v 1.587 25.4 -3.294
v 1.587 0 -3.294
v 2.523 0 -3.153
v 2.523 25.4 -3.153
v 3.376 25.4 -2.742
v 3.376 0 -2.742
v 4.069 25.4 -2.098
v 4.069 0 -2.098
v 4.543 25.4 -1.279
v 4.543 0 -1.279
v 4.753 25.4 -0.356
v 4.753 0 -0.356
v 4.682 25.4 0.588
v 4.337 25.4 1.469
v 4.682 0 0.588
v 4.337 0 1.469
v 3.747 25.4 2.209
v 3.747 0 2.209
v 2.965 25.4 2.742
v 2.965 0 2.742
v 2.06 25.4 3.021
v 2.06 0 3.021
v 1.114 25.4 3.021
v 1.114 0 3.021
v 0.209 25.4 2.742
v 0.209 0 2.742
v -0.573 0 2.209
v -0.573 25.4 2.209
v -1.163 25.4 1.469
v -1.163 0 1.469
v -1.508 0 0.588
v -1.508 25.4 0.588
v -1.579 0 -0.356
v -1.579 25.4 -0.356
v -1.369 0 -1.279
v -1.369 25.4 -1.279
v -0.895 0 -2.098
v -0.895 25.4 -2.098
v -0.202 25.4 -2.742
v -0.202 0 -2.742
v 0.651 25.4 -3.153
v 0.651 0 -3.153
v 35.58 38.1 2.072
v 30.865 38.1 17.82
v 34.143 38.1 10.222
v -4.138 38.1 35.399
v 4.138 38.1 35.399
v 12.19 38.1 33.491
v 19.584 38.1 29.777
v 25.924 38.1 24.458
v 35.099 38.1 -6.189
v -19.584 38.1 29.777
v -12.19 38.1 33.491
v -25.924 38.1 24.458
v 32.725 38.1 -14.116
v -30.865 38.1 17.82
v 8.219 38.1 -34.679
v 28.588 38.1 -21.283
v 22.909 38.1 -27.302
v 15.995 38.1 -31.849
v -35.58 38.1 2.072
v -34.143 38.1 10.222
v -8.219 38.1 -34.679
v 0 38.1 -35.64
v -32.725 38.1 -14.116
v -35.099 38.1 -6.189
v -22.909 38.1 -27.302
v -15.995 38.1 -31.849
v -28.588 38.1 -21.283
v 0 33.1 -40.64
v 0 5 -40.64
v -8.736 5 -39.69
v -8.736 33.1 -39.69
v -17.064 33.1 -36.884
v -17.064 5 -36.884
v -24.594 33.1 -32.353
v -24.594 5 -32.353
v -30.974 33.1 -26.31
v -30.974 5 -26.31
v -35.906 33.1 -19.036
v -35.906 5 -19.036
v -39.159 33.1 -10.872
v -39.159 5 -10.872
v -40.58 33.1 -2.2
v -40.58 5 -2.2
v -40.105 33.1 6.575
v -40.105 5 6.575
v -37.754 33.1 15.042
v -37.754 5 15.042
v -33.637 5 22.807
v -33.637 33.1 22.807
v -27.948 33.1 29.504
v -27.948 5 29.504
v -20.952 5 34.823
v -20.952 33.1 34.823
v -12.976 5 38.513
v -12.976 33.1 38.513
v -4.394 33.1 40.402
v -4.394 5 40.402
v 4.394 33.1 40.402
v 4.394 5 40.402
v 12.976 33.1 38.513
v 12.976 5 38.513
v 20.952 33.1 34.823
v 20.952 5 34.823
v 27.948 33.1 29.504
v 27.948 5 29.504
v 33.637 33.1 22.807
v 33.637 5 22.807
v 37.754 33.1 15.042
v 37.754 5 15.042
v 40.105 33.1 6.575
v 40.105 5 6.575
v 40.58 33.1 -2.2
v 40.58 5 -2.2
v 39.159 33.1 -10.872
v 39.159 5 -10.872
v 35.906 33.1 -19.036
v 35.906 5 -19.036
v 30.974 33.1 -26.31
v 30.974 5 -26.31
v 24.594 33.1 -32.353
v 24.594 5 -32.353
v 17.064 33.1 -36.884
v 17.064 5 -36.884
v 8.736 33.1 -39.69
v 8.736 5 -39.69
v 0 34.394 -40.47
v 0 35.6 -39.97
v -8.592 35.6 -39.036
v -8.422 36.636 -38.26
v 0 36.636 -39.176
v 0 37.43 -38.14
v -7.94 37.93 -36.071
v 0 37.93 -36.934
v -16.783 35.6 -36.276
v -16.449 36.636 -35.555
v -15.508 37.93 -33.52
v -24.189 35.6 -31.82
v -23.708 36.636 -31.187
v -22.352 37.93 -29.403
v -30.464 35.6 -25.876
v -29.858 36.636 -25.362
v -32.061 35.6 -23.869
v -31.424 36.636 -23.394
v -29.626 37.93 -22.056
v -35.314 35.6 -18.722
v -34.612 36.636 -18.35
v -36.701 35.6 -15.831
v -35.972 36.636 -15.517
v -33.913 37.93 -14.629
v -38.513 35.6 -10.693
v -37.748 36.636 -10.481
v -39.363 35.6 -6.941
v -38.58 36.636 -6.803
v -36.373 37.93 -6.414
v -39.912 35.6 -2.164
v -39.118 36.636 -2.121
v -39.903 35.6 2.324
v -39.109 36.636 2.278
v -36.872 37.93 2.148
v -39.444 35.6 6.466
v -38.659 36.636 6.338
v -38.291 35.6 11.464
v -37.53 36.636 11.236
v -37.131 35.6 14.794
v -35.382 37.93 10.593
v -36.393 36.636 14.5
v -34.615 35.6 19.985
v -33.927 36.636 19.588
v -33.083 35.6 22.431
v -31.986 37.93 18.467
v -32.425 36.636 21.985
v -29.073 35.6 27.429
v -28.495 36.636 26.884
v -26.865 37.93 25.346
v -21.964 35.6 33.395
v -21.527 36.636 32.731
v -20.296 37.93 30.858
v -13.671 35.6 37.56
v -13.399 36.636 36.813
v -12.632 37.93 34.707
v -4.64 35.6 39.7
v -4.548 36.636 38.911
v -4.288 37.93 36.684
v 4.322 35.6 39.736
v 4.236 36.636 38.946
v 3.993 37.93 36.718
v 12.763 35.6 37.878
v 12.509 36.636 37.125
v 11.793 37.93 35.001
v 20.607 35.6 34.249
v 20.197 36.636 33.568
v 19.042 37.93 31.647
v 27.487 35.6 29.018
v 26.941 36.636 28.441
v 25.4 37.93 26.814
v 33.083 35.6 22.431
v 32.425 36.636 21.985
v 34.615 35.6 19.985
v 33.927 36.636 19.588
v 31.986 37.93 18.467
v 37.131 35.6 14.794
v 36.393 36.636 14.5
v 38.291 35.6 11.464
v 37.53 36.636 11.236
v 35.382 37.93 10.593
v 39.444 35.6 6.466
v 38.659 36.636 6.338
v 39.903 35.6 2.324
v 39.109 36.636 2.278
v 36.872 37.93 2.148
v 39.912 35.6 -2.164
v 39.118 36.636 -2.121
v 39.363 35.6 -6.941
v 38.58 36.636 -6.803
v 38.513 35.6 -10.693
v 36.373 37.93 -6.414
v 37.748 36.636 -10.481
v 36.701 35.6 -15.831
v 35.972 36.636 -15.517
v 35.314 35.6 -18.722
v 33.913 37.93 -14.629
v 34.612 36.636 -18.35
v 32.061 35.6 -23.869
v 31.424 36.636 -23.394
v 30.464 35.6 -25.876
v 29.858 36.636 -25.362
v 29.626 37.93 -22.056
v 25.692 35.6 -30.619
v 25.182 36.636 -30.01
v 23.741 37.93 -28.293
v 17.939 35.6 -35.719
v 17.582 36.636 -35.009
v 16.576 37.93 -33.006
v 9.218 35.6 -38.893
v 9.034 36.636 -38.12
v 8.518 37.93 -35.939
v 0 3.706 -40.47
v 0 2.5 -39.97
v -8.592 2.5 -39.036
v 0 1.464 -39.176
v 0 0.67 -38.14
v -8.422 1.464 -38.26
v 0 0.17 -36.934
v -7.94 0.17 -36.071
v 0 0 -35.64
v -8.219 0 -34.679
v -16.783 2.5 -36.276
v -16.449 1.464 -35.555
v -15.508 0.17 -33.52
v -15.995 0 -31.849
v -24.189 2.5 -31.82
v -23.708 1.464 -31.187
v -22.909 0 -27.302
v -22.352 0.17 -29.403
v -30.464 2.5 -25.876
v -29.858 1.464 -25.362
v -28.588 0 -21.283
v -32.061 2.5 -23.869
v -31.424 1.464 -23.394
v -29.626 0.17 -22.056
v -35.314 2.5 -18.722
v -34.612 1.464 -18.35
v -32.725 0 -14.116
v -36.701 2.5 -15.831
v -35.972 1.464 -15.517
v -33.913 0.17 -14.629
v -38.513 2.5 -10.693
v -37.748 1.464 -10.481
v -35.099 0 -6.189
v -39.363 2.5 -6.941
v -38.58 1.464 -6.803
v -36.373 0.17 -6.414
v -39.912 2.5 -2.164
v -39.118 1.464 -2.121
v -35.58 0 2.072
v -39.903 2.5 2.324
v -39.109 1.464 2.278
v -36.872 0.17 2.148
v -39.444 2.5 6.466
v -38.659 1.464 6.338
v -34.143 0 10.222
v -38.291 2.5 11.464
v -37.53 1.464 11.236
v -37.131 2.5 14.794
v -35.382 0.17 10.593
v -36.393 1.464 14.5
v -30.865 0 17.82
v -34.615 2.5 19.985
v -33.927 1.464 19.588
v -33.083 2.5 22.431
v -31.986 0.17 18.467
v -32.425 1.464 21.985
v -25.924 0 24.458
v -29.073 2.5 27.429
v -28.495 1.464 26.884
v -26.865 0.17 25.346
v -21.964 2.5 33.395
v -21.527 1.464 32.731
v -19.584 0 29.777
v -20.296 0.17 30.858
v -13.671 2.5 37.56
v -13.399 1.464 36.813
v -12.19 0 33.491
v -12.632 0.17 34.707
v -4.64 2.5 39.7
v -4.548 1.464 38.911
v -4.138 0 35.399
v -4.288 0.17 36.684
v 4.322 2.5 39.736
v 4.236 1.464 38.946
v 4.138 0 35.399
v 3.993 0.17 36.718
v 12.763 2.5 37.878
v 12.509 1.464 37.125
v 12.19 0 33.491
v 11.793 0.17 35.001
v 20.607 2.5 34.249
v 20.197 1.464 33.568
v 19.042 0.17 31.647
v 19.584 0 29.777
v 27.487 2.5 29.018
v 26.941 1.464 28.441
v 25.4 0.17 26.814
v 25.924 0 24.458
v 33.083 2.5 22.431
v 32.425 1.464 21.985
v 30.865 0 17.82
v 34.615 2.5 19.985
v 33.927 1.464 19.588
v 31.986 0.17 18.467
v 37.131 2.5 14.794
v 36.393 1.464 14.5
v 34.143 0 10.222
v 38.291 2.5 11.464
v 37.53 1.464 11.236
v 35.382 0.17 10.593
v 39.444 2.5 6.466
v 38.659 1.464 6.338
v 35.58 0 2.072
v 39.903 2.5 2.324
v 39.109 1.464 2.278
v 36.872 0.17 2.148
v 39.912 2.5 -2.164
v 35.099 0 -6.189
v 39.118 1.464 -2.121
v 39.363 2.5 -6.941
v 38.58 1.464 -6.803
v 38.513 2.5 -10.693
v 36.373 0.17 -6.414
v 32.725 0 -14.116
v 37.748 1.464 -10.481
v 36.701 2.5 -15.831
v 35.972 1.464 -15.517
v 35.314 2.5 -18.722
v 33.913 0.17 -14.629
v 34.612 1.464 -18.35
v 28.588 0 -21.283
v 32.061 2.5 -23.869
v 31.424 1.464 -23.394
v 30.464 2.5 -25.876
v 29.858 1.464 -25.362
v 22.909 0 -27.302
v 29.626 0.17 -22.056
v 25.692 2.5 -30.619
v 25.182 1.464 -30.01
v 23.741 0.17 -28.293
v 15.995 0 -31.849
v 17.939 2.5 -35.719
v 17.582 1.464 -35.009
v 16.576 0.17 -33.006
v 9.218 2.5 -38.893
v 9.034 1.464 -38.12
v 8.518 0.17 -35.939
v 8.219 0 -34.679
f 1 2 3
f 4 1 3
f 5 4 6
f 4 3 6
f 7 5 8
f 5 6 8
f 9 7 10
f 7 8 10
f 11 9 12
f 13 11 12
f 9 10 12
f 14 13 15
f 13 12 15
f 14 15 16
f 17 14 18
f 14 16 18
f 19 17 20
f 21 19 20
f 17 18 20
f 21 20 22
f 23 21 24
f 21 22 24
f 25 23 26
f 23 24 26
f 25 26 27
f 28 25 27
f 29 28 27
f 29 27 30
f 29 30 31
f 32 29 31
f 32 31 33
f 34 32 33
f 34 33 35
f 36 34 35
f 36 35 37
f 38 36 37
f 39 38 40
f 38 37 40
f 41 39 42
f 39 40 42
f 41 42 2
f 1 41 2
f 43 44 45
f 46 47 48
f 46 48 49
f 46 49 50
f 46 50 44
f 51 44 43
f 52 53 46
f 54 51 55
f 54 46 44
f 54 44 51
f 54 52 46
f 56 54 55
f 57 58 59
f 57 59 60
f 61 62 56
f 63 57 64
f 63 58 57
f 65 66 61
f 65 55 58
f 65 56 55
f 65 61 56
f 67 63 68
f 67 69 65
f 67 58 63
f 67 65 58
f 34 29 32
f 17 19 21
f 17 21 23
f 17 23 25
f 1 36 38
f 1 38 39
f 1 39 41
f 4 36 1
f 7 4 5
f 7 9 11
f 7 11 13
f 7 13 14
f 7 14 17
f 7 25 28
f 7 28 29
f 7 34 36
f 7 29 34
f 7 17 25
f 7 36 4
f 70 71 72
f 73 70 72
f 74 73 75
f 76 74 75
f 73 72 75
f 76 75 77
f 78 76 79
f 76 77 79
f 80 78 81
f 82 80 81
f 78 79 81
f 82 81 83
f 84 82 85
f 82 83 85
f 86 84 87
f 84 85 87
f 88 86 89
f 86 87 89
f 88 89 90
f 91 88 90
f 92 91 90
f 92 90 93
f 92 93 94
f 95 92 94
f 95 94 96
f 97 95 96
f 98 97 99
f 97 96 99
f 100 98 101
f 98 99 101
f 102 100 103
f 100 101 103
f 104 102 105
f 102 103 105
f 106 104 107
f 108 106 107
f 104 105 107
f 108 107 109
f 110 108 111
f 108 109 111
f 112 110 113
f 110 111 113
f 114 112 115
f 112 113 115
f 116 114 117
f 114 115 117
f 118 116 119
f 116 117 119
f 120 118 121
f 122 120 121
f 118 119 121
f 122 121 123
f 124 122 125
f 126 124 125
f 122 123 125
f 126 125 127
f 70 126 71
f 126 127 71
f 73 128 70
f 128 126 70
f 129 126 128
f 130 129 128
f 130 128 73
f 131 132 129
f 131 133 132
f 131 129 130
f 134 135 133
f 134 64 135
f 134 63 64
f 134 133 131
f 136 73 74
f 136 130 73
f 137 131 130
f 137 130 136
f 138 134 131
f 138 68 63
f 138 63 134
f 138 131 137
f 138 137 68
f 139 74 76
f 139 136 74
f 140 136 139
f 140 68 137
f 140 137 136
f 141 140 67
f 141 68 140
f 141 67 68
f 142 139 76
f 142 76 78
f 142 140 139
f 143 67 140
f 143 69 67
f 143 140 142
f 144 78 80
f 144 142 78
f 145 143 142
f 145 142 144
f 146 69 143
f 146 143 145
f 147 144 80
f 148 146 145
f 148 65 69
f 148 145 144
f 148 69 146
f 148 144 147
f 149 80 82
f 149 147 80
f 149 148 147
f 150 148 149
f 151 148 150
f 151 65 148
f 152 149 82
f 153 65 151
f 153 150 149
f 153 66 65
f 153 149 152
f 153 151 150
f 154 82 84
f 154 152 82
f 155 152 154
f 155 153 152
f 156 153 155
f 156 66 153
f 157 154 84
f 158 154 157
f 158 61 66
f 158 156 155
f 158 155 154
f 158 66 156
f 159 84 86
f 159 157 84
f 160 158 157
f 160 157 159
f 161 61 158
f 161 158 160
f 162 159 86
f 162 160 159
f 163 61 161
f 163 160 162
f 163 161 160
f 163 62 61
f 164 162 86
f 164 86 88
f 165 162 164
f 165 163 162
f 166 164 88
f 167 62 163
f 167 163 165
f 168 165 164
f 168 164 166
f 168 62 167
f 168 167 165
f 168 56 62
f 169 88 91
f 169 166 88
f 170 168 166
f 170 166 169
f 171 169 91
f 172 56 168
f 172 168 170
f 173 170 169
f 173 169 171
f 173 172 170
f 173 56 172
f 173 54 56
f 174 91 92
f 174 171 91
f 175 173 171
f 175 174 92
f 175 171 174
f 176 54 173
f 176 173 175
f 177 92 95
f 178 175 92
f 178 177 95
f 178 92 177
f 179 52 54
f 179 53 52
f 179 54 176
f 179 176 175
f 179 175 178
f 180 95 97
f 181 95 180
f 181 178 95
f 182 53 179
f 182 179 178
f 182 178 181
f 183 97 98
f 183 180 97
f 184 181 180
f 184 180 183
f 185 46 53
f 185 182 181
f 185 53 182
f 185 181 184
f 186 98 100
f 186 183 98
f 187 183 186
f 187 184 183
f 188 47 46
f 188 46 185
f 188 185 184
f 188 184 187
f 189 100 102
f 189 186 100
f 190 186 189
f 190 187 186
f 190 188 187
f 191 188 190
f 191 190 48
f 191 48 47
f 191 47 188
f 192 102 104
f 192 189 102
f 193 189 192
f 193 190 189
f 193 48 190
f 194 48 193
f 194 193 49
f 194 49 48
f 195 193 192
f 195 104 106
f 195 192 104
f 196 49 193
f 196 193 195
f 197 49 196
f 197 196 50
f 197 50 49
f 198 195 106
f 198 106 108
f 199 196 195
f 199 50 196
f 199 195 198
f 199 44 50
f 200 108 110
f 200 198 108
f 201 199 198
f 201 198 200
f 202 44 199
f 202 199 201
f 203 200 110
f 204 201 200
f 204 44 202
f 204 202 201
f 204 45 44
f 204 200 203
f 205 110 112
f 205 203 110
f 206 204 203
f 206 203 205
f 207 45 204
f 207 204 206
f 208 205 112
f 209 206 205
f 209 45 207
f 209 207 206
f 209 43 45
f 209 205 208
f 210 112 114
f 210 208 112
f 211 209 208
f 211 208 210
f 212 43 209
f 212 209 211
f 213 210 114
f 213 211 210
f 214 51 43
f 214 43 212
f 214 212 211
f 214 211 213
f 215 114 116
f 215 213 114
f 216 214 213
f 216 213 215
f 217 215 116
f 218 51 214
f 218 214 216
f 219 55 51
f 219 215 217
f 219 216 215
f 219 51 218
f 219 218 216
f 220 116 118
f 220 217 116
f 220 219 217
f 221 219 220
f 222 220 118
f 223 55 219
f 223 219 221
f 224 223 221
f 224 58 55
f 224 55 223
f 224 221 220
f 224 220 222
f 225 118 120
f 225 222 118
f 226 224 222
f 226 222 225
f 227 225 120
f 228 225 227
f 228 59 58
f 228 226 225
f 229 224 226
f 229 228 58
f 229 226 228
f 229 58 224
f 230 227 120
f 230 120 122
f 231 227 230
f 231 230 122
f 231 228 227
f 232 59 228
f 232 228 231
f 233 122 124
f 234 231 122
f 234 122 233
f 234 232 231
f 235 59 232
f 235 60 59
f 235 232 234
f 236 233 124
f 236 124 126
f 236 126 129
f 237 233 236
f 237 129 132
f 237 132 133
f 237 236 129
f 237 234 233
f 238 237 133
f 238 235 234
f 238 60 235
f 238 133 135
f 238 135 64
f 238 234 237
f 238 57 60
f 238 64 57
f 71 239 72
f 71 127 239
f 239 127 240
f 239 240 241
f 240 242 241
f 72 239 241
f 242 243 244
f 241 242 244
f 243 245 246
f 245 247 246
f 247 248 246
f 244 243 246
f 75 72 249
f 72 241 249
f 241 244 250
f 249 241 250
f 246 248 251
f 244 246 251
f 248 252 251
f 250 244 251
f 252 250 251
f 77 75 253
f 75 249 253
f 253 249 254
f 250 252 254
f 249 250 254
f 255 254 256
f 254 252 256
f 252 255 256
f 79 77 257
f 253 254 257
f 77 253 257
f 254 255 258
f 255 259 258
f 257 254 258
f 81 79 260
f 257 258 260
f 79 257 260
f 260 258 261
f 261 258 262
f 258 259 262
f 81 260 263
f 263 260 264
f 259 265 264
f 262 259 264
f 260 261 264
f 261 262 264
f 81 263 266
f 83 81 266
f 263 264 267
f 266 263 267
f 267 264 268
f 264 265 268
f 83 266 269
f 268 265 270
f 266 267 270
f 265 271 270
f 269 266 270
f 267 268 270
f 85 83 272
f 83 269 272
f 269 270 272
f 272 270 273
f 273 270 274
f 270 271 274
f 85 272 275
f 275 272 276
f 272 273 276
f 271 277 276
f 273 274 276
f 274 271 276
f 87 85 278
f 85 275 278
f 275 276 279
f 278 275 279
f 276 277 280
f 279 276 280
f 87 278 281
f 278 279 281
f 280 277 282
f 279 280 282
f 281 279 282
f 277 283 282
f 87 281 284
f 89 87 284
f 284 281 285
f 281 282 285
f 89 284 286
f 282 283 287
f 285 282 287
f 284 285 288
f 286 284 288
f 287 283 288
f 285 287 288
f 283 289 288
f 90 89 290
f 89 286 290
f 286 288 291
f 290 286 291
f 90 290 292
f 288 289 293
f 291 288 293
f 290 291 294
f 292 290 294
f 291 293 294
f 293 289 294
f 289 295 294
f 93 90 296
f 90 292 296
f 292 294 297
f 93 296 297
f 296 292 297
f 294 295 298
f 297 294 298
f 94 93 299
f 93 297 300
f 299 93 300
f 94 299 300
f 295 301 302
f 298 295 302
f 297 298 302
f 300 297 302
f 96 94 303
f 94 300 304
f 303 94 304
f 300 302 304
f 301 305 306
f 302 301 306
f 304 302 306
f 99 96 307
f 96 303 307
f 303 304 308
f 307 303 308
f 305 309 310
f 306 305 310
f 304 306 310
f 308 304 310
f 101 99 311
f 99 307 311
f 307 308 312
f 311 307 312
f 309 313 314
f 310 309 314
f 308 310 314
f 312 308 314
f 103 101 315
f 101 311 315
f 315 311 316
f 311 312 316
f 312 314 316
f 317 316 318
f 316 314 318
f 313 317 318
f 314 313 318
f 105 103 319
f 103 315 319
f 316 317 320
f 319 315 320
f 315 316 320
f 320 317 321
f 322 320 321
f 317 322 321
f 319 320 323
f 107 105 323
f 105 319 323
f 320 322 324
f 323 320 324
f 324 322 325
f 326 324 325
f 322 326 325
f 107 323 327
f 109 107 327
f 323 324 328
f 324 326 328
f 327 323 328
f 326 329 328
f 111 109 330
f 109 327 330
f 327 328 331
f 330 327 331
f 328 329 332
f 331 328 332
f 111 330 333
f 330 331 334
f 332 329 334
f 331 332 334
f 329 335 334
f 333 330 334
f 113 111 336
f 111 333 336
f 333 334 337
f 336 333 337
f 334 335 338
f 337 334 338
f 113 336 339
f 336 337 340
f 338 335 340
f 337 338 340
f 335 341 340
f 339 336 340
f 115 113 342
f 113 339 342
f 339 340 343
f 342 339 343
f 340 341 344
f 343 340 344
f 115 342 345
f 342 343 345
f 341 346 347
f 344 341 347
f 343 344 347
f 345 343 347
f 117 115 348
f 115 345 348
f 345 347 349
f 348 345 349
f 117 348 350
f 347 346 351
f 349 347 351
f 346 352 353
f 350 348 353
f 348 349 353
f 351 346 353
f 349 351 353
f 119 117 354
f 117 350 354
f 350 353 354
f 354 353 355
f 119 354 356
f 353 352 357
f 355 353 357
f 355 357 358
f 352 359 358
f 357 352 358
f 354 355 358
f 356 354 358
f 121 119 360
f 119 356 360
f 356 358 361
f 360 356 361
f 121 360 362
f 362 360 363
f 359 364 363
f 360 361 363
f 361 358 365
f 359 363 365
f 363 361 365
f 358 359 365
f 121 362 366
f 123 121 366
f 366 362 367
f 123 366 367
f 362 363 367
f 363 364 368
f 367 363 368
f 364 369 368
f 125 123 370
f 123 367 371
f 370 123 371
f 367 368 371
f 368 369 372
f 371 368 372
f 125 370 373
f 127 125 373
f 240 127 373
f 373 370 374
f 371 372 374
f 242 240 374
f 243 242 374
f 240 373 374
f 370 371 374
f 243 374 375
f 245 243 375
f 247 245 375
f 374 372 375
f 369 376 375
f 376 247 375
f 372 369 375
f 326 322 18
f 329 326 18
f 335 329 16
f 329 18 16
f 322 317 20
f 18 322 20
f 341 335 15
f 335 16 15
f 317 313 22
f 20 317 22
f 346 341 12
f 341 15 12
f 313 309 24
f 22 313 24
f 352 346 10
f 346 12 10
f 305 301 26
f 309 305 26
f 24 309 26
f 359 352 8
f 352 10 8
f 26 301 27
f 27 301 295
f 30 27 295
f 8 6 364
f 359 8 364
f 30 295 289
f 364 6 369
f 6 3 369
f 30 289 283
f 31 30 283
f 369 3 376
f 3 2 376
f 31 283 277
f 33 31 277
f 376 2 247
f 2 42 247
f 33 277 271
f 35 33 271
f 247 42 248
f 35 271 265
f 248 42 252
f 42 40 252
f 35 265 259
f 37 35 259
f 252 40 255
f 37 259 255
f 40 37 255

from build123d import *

# Parameters (mm, degrees)
SKETCH1_R           = 40.64
BOSS_EXTRUDE1_DEPTH = 38.100000066
FILLET1_R           = 5
SKETCH2_R           = 3.175
CUT_EXTRUDE1_DEPTH  = 25.4


with BuildPart() as part:
    # Sketch1 → Boss-Extrude1 (new body)
    with BuildSketch(Plane(origin=(0, 0, 0), x_dir=(1, 0, 0), z_dir=(0, 1, 0))):
        with Locations(Location((0, 0, 0), (0, 0, 90))):
            Circle(SKETCH1_R)
    extrude(amount=BOSS_EXTRUDE1_DEPTH)

    # Fillet1
    fillet1_edges = [part.edges().sort_by_distance(p)[0] for p in [
        (0, 0, 40.64),
        (0, 38.100000066, 40.64),
    ]]
    fillet(fillet1_edges, radius=FILLET1_R)

    # Sketch2 → Cut-Extrude1 (cut)
    with BuildSketch(Plane.XZ):
        with Locations(Location((1.587001014, -0.118729115, 0), (0, 0, 270))):
            Circle(SKETCH2_R)
    extrude(amount=-CUT_EXTRUDE1_DEPTH, mode=Mode.SUBTRACT)


solid = part.part
